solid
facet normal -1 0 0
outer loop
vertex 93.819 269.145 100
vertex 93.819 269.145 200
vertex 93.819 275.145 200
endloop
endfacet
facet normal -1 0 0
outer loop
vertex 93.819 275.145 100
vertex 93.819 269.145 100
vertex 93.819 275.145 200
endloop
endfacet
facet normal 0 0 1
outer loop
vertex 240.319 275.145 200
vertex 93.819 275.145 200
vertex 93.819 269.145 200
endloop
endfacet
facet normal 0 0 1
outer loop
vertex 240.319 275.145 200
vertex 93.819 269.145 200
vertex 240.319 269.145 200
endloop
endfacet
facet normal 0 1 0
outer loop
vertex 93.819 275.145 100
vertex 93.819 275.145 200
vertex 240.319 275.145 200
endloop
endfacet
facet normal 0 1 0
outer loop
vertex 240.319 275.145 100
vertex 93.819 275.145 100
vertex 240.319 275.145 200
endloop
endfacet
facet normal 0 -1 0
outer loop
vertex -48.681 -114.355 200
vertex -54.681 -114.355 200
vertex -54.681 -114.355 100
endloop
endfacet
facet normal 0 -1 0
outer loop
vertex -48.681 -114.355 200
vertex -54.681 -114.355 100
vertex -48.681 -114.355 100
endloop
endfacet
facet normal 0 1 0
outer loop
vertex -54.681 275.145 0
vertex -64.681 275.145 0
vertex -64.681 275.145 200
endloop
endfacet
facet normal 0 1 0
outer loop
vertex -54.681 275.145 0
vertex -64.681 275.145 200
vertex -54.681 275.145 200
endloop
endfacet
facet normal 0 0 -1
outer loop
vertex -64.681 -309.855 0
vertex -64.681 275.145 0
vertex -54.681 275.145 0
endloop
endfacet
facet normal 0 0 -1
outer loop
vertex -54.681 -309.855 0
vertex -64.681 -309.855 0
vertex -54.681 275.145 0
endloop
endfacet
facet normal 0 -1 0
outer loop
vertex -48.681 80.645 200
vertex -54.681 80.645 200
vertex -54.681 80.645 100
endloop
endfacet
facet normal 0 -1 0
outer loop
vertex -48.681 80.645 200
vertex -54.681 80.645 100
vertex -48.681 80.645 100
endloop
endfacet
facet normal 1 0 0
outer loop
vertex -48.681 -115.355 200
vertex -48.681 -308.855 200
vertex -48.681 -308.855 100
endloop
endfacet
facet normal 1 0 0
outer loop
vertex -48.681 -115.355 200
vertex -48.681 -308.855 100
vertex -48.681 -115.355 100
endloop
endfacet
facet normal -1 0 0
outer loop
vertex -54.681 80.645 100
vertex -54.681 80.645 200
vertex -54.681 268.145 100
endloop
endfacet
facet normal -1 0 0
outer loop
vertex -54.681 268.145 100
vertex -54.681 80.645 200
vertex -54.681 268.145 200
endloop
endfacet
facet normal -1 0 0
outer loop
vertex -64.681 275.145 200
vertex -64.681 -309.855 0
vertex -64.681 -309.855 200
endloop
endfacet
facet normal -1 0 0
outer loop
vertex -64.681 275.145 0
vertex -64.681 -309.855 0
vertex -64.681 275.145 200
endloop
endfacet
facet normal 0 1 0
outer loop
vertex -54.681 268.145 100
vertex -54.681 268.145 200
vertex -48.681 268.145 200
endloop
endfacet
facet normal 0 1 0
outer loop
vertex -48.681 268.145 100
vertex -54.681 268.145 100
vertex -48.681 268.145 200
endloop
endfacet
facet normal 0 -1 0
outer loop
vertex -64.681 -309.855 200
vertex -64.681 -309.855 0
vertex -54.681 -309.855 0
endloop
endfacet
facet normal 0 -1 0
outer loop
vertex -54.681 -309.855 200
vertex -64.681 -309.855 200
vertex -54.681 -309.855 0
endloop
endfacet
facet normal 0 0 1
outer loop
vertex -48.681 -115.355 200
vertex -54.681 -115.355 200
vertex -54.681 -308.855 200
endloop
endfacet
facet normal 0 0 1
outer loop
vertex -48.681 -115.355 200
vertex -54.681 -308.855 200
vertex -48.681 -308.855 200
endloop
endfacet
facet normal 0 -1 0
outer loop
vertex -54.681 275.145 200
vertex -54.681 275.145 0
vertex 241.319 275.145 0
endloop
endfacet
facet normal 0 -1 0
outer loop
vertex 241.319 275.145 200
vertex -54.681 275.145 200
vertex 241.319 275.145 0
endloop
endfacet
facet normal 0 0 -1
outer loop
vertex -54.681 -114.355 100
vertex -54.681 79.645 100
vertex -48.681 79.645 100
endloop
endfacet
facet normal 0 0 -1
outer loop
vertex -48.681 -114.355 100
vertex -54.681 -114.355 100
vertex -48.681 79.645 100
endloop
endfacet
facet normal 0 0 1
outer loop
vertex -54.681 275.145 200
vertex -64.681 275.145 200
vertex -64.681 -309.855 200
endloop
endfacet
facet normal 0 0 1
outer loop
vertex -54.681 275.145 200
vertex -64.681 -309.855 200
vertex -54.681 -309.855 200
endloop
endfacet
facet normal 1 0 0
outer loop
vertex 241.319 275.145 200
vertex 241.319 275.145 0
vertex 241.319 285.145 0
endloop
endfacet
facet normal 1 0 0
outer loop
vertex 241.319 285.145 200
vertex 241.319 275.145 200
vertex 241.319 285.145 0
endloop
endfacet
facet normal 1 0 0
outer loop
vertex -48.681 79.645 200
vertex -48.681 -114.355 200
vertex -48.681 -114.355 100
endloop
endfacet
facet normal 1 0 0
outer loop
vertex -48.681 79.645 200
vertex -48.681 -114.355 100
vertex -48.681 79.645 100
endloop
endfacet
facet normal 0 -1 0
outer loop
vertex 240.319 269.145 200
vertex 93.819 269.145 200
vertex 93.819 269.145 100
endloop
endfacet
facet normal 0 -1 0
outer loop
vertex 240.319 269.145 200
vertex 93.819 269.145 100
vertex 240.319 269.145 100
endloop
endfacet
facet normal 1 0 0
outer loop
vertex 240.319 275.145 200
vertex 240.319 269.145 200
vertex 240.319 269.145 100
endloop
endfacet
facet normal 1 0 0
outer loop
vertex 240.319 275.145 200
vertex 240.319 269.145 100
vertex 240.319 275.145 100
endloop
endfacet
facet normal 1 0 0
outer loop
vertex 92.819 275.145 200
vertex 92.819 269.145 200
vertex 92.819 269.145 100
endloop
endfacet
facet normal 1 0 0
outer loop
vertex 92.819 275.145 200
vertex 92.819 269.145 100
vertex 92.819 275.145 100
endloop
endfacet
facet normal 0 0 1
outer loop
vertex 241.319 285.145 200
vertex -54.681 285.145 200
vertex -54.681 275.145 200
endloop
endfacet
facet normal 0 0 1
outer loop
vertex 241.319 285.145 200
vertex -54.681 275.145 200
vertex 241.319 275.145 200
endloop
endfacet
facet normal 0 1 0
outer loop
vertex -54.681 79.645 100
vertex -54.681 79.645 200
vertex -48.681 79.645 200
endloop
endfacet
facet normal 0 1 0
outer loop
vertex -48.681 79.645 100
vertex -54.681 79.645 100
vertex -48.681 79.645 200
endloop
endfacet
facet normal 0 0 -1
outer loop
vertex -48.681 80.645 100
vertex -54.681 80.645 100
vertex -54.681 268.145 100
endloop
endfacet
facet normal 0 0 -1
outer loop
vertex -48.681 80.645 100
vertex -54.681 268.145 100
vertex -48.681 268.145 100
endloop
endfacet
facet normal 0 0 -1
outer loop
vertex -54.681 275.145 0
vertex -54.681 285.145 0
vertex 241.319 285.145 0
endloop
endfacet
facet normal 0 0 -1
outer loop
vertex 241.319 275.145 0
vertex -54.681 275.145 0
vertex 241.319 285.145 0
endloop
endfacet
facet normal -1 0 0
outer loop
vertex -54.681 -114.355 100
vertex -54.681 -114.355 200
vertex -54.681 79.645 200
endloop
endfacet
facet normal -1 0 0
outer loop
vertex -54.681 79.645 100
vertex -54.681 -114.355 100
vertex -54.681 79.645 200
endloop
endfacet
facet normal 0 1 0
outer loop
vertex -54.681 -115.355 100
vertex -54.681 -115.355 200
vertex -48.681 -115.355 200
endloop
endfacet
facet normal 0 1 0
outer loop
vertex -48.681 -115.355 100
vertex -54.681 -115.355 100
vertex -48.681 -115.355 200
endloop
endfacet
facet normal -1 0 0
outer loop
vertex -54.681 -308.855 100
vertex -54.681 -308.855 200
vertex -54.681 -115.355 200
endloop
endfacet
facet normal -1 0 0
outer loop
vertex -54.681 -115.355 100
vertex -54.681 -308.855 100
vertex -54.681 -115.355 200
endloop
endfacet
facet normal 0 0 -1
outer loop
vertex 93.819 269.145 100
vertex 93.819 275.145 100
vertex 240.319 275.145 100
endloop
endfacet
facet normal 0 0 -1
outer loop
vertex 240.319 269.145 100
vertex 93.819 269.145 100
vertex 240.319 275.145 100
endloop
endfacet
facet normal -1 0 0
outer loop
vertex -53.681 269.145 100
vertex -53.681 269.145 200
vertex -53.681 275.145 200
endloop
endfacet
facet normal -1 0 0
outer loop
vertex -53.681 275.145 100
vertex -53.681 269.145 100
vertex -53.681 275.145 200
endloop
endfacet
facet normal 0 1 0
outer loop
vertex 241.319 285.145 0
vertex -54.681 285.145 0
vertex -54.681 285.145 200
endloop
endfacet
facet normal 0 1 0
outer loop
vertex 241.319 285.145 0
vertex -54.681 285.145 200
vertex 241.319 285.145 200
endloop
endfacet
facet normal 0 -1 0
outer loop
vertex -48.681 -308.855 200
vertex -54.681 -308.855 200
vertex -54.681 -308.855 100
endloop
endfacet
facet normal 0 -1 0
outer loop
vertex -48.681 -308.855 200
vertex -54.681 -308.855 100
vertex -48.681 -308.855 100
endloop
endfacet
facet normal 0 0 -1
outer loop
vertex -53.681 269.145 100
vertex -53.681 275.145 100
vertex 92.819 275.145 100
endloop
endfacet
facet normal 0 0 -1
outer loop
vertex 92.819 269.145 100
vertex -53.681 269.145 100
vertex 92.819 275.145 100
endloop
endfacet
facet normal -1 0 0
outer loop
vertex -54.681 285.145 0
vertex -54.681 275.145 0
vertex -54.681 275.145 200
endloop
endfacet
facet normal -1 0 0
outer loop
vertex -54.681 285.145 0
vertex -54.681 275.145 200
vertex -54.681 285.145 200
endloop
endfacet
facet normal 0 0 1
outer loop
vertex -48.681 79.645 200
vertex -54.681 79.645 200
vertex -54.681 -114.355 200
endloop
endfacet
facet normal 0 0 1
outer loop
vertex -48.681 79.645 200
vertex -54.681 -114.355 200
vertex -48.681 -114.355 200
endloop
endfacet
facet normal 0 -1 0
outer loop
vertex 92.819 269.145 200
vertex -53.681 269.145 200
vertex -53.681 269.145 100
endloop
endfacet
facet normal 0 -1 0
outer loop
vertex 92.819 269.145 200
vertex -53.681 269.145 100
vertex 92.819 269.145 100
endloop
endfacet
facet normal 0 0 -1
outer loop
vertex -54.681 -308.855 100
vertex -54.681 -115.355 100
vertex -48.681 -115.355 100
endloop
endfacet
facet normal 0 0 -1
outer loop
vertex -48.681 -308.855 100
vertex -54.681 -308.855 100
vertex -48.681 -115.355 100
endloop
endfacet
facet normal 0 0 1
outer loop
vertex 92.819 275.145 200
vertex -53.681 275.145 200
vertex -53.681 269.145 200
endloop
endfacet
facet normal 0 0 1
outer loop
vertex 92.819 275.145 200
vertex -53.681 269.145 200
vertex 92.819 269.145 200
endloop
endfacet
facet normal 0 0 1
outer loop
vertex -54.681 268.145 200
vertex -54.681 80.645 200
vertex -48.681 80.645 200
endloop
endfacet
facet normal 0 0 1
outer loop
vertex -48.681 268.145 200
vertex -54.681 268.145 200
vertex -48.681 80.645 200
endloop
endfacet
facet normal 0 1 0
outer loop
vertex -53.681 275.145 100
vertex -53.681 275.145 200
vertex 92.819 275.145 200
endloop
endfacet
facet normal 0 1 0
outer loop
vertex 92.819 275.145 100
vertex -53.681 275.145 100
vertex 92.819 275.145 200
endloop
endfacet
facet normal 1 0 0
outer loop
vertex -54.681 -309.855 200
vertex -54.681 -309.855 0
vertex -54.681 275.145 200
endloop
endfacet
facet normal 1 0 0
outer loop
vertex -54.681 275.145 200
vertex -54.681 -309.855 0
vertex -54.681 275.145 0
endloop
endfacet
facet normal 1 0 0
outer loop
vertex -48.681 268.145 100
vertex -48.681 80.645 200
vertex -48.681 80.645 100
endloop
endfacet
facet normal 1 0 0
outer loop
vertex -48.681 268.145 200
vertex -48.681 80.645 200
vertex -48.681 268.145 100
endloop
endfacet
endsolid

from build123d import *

# Parameters (mm, degrees)
F0_W     = 296
F0_H     = 10
F0_W_2   = 10
F0_H_2   = 585
F1_DEPTH = 200
F3_W     = 6
F3_H     = 187.5
F3_H_2   = 194
F3_H_3   = 193.5
F2_W     = 146.5
F2_H     = 6
F4_DEPTH = 100


with BuildPart() as f1:
    # F0 (on Top) → F1 (new body)
    with BuildSketch(Plane.XY):
        with Locations((93.318945, 280.145143)):
            Rectangle(F0_W, F0_H)
        with Locations((-59.681055, -17.354857)):
            Rectangle(F0_W_2, F0_H_2)
    extrude(amount=F1_DEPTH)


with BuildPart() as f4:
    # F3 (on face) + F2 (on face) → F4 (new body)
    with BuildSketch(Plane.XY.offset(200)):
        with Locations((-51.681055, 174.395143)):
            Rectangle(F3_W, F3_H)
        with Locations((-51.681055, -17.354857)):
            Rectangle(F3_W, F3_H_2)
        with Locations((-51.681055, -212.104857)):
            Rectangle(F3_W, F3_H_3)
    with BuildSketch(Plane.XY.offset(200)):
        with Locations((19.568945, 272.145143)):
            Rectangle(F2_W, F2_H)
        with Locations((167.068945, 272.145143)):
            Rectangle(F2_W, F2_H)
    extrude(amount=-F4_DEPTH)


solid = Compound([f1.part, f4.part])
